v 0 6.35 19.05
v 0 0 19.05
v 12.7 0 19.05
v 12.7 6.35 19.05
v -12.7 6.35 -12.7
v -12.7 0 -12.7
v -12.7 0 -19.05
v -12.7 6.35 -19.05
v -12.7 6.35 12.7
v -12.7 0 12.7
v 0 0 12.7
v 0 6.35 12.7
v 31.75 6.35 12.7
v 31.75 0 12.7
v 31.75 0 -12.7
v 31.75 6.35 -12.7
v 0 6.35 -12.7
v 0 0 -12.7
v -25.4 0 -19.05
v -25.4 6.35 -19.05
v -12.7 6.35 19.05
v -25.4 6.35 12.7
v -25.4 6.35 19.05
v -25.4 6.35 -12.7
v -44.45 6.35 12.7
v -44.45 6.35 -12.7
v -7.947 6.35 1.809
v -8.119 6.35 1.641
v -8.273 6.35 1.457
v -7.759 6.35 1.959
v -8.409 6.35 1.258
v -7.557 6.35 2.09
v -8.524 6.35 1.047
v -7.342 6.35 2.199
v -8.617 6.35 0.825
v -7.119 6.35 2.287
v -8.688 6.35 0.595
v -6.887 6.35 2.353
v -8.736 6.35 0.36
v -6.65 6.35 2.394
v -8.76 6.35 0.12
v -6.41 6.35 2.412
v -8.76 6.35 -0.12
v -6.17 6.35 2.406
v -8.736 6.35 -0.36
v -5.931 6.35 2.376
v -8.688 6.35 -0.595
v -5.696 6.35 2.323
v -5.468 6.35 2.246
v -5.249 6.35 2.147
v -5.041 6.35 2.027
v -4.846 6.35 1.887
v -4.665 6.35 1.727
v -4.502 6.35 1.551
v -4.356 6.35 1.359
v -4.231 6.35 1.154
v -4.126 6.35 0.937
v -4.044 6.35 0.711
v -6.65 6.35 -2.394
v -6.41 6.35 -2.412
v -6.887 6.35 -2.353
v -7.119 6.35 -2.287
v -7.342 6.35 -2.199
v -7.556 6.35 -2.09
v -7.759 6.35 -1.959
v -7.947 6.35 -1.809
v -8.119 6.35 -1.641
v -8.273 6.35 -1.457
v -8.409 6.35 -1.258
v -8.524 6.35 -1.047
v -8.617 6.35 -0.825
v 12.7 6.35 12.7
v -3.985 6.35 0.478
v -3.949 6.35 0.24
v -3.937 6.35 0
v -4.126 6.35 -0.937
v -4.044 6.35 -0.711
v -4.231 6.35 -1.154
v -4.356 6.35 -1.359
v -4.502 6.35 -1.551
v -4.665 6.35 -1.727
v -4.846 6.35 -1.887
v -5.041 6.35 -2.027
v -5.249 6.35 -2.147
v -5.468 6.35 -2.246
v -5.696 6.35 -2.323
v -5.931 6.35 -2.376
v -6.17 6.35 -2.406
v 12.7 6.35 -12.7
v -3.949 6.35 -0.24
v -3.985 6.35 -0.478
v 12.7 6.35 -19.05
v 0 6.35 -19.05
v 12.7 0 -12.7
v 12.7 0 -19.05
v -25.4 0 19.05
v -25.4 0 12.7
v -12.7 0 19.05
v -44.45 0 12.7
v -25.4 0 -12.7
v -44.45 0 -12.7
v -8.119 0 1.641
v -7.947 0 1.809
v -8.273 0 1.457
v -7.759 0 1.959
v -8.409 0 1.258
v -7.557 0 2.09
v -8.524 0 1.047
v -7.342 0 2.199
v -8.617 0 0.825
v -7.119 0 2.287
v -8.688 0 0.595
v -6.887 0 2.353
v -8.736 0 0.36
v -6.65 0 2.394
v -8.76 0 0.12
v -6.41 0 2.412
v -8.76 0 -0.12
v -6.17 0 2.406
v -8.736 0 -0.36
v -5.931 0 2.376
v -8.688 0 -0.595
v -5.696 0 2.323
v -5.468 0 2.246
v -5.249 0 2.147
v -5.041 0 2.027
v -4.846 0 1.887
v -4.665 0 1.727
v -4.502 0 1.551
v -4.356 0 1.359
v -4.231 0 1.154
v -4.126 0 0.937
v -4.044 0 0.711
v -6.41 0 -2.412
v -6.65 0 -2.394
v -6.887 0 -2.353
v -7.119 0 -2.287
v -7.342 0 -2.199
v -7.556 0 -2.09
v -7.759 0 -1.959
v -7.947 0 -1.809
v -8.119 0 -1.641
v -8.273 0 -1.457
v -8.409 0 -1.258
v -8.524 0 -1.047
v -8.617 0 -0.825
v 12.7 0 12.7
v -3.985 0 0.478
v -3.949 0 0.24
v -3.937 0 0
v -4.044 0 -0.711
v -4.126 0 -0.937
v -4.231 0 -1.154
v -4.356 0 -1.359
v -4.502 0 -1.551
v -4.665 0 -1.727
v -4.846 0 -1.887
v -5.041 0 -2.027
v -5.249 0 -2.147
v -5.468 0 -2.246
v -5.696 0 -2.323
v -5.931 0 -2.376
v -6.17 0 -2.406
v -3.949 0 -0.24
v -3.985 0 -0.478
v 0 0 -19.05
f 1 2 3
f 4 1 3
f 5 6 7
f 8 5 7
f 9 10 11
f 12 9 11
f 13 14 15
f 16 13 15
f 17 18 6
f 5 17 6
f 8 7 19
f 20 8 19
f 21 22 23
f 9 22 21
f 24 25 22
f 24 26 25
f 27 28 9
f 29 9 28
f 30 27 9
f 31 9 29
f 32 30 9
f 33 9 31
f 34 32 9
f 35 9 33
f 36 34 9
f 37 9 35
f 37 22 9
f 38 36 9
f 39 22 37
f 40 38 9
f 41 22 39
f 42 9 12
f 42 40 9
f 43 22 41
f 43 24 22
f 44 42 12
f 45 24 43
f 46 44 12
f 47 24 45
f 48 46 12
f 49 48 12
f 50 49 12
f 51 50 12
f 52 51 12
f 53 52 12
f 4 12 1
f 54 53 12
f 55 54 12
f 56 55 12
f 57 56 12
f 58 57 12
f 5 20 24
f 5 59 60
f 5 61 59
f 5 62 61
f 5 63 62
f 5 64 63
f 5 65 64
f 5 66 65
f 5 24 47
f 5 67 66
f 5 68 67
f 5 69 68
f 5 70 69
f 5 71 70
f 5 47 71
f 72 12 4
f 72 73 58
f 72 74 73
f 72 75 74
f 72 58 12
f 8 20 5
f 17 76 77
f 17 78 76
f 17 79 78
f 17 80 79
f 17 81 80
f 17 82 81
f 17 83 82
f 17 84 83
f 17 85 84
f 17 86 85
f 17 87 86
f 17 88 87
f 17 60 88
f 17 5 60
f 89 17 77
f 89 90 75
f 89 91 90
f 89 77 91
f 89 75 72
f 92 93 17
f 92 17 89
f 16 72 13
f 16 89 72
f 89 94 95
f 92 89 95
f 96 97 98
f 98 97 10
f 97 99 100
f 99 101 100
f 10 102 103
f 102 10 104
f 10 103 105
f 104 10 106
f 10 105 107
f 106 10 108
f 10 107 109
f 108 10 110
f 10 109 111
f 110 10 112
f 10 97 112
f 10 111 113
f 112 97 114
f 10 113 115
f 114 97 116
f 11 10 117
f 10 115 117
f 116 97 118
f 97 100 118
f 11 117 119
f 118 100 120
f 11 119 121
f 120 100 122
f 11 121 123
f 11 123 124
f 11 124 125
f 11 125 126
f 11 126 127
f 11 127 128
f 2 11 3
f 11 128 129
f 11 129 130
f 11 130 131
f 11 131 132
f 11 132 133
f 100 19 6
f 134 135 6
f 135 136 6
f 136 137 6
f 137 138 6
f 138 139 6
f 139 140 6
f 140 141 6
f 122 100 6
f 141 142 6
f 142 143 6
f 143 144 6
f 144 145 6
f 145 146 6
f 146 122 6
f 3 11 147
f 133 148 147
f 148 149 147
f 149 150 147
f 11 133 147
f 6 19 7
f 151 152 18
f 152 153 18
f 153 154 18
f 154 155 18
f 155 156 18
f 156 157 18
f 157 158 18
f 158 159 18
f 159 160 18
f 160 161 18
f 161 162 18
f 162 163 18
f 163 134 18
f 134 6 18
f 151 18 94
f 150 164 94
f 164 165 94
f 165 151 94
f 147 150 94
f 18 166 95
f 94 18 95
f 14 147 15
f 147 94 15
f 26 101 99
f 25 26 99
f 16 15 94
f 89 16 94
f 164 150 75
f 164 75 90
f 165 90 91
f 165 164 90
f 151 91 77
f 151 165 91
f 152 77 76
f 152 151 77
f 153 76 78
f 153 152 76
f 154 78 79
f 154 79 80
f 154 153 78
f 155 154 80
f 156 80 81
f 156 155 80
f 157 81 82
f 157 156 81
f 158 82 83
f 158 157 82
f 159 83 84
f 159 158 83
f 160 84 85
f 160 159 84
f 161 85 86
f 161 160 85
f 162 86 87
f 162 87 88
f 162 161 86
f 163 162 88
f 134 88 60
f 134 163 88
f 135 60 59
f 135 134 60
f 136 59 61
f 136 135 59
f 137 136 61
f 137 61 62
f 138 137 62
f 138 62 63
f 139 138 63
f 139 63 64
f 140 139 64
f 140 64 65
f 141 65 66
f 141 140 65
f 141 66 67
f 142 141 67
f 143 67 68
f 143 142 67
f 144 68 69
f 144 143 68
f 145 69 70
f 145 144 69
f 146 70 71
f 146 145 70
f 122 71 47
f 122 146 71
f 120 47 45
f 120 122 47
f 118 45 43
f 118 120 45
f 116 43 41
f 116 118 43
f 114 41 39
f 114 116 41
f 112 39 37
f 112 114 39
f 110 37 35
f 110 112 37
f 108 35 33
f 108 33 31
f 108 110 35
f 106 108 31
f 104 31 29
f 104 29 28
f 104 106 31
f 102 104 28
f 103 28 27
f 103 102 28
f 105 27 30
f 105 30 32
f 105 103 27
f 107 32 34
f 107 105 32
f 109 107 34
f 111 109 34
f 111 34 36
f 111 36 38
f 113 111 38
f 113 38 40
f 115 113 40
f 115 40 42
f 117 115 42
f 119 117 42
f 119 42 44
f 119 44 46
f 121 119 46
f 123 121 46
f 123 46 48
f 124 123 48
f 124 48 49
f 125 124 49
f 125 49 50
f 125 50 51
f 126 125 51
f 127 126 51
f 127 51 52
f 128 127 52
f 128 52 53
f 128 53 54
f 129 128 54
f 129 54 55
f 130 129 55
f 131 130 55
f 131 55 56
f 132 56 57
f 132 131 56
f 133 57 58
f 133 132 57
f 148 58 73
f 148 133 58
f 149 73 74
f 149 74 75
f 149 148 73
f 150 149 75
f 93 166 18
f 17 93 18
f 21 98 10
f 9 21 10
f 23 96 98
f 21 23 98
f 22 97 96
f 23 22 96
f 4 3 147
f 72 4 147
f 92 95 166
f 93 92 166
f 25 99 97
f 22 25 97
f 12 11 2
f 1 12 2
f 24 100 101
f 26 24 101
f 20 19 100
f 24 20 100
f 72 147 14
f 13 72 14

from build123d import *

# Parameters (mm, degrees)
SKETCH1_R           = 2.413
BOSS_EXTRUDE1_DEPTH = 6.35


with BuildPart() as part:
    # Sketch1 → Boss-Extrude1 (new body)
    with BuildSketch(Plane(origin=(0, 0, 0), x_dir=(1, 0, 0), z_dir=(0, 1, 0))):
        Polygon((-44.45, -12.7), (-31.75, -12.7), (-25.4, -12.7), (-25.4, -19.05), (-12.7, -19.05), (-12.7, -12.7), (0, -12.7), (0, -19.05), (12.7, -19.05), (12.7, -12.7), (31.75, -12.7), (31.75, 12.7), (12.7, 12.7), (12.7, 19.05), (0, 19.05), (0, 12.7), (-12.7, 12.7), (-12.7, 19.05), (-25.4, 19.05), (-25.4, 12.7), (-31.75, 12.7), (-44.45, 12.7), align=None)
        with Locations((-6.35, 0)):
            Circle(SKETCH1_R, mode=Mode.SUBTRACT)
    extrude(amount=BOSS_EXTRUDE1_DEPTH)


solid = part.part
